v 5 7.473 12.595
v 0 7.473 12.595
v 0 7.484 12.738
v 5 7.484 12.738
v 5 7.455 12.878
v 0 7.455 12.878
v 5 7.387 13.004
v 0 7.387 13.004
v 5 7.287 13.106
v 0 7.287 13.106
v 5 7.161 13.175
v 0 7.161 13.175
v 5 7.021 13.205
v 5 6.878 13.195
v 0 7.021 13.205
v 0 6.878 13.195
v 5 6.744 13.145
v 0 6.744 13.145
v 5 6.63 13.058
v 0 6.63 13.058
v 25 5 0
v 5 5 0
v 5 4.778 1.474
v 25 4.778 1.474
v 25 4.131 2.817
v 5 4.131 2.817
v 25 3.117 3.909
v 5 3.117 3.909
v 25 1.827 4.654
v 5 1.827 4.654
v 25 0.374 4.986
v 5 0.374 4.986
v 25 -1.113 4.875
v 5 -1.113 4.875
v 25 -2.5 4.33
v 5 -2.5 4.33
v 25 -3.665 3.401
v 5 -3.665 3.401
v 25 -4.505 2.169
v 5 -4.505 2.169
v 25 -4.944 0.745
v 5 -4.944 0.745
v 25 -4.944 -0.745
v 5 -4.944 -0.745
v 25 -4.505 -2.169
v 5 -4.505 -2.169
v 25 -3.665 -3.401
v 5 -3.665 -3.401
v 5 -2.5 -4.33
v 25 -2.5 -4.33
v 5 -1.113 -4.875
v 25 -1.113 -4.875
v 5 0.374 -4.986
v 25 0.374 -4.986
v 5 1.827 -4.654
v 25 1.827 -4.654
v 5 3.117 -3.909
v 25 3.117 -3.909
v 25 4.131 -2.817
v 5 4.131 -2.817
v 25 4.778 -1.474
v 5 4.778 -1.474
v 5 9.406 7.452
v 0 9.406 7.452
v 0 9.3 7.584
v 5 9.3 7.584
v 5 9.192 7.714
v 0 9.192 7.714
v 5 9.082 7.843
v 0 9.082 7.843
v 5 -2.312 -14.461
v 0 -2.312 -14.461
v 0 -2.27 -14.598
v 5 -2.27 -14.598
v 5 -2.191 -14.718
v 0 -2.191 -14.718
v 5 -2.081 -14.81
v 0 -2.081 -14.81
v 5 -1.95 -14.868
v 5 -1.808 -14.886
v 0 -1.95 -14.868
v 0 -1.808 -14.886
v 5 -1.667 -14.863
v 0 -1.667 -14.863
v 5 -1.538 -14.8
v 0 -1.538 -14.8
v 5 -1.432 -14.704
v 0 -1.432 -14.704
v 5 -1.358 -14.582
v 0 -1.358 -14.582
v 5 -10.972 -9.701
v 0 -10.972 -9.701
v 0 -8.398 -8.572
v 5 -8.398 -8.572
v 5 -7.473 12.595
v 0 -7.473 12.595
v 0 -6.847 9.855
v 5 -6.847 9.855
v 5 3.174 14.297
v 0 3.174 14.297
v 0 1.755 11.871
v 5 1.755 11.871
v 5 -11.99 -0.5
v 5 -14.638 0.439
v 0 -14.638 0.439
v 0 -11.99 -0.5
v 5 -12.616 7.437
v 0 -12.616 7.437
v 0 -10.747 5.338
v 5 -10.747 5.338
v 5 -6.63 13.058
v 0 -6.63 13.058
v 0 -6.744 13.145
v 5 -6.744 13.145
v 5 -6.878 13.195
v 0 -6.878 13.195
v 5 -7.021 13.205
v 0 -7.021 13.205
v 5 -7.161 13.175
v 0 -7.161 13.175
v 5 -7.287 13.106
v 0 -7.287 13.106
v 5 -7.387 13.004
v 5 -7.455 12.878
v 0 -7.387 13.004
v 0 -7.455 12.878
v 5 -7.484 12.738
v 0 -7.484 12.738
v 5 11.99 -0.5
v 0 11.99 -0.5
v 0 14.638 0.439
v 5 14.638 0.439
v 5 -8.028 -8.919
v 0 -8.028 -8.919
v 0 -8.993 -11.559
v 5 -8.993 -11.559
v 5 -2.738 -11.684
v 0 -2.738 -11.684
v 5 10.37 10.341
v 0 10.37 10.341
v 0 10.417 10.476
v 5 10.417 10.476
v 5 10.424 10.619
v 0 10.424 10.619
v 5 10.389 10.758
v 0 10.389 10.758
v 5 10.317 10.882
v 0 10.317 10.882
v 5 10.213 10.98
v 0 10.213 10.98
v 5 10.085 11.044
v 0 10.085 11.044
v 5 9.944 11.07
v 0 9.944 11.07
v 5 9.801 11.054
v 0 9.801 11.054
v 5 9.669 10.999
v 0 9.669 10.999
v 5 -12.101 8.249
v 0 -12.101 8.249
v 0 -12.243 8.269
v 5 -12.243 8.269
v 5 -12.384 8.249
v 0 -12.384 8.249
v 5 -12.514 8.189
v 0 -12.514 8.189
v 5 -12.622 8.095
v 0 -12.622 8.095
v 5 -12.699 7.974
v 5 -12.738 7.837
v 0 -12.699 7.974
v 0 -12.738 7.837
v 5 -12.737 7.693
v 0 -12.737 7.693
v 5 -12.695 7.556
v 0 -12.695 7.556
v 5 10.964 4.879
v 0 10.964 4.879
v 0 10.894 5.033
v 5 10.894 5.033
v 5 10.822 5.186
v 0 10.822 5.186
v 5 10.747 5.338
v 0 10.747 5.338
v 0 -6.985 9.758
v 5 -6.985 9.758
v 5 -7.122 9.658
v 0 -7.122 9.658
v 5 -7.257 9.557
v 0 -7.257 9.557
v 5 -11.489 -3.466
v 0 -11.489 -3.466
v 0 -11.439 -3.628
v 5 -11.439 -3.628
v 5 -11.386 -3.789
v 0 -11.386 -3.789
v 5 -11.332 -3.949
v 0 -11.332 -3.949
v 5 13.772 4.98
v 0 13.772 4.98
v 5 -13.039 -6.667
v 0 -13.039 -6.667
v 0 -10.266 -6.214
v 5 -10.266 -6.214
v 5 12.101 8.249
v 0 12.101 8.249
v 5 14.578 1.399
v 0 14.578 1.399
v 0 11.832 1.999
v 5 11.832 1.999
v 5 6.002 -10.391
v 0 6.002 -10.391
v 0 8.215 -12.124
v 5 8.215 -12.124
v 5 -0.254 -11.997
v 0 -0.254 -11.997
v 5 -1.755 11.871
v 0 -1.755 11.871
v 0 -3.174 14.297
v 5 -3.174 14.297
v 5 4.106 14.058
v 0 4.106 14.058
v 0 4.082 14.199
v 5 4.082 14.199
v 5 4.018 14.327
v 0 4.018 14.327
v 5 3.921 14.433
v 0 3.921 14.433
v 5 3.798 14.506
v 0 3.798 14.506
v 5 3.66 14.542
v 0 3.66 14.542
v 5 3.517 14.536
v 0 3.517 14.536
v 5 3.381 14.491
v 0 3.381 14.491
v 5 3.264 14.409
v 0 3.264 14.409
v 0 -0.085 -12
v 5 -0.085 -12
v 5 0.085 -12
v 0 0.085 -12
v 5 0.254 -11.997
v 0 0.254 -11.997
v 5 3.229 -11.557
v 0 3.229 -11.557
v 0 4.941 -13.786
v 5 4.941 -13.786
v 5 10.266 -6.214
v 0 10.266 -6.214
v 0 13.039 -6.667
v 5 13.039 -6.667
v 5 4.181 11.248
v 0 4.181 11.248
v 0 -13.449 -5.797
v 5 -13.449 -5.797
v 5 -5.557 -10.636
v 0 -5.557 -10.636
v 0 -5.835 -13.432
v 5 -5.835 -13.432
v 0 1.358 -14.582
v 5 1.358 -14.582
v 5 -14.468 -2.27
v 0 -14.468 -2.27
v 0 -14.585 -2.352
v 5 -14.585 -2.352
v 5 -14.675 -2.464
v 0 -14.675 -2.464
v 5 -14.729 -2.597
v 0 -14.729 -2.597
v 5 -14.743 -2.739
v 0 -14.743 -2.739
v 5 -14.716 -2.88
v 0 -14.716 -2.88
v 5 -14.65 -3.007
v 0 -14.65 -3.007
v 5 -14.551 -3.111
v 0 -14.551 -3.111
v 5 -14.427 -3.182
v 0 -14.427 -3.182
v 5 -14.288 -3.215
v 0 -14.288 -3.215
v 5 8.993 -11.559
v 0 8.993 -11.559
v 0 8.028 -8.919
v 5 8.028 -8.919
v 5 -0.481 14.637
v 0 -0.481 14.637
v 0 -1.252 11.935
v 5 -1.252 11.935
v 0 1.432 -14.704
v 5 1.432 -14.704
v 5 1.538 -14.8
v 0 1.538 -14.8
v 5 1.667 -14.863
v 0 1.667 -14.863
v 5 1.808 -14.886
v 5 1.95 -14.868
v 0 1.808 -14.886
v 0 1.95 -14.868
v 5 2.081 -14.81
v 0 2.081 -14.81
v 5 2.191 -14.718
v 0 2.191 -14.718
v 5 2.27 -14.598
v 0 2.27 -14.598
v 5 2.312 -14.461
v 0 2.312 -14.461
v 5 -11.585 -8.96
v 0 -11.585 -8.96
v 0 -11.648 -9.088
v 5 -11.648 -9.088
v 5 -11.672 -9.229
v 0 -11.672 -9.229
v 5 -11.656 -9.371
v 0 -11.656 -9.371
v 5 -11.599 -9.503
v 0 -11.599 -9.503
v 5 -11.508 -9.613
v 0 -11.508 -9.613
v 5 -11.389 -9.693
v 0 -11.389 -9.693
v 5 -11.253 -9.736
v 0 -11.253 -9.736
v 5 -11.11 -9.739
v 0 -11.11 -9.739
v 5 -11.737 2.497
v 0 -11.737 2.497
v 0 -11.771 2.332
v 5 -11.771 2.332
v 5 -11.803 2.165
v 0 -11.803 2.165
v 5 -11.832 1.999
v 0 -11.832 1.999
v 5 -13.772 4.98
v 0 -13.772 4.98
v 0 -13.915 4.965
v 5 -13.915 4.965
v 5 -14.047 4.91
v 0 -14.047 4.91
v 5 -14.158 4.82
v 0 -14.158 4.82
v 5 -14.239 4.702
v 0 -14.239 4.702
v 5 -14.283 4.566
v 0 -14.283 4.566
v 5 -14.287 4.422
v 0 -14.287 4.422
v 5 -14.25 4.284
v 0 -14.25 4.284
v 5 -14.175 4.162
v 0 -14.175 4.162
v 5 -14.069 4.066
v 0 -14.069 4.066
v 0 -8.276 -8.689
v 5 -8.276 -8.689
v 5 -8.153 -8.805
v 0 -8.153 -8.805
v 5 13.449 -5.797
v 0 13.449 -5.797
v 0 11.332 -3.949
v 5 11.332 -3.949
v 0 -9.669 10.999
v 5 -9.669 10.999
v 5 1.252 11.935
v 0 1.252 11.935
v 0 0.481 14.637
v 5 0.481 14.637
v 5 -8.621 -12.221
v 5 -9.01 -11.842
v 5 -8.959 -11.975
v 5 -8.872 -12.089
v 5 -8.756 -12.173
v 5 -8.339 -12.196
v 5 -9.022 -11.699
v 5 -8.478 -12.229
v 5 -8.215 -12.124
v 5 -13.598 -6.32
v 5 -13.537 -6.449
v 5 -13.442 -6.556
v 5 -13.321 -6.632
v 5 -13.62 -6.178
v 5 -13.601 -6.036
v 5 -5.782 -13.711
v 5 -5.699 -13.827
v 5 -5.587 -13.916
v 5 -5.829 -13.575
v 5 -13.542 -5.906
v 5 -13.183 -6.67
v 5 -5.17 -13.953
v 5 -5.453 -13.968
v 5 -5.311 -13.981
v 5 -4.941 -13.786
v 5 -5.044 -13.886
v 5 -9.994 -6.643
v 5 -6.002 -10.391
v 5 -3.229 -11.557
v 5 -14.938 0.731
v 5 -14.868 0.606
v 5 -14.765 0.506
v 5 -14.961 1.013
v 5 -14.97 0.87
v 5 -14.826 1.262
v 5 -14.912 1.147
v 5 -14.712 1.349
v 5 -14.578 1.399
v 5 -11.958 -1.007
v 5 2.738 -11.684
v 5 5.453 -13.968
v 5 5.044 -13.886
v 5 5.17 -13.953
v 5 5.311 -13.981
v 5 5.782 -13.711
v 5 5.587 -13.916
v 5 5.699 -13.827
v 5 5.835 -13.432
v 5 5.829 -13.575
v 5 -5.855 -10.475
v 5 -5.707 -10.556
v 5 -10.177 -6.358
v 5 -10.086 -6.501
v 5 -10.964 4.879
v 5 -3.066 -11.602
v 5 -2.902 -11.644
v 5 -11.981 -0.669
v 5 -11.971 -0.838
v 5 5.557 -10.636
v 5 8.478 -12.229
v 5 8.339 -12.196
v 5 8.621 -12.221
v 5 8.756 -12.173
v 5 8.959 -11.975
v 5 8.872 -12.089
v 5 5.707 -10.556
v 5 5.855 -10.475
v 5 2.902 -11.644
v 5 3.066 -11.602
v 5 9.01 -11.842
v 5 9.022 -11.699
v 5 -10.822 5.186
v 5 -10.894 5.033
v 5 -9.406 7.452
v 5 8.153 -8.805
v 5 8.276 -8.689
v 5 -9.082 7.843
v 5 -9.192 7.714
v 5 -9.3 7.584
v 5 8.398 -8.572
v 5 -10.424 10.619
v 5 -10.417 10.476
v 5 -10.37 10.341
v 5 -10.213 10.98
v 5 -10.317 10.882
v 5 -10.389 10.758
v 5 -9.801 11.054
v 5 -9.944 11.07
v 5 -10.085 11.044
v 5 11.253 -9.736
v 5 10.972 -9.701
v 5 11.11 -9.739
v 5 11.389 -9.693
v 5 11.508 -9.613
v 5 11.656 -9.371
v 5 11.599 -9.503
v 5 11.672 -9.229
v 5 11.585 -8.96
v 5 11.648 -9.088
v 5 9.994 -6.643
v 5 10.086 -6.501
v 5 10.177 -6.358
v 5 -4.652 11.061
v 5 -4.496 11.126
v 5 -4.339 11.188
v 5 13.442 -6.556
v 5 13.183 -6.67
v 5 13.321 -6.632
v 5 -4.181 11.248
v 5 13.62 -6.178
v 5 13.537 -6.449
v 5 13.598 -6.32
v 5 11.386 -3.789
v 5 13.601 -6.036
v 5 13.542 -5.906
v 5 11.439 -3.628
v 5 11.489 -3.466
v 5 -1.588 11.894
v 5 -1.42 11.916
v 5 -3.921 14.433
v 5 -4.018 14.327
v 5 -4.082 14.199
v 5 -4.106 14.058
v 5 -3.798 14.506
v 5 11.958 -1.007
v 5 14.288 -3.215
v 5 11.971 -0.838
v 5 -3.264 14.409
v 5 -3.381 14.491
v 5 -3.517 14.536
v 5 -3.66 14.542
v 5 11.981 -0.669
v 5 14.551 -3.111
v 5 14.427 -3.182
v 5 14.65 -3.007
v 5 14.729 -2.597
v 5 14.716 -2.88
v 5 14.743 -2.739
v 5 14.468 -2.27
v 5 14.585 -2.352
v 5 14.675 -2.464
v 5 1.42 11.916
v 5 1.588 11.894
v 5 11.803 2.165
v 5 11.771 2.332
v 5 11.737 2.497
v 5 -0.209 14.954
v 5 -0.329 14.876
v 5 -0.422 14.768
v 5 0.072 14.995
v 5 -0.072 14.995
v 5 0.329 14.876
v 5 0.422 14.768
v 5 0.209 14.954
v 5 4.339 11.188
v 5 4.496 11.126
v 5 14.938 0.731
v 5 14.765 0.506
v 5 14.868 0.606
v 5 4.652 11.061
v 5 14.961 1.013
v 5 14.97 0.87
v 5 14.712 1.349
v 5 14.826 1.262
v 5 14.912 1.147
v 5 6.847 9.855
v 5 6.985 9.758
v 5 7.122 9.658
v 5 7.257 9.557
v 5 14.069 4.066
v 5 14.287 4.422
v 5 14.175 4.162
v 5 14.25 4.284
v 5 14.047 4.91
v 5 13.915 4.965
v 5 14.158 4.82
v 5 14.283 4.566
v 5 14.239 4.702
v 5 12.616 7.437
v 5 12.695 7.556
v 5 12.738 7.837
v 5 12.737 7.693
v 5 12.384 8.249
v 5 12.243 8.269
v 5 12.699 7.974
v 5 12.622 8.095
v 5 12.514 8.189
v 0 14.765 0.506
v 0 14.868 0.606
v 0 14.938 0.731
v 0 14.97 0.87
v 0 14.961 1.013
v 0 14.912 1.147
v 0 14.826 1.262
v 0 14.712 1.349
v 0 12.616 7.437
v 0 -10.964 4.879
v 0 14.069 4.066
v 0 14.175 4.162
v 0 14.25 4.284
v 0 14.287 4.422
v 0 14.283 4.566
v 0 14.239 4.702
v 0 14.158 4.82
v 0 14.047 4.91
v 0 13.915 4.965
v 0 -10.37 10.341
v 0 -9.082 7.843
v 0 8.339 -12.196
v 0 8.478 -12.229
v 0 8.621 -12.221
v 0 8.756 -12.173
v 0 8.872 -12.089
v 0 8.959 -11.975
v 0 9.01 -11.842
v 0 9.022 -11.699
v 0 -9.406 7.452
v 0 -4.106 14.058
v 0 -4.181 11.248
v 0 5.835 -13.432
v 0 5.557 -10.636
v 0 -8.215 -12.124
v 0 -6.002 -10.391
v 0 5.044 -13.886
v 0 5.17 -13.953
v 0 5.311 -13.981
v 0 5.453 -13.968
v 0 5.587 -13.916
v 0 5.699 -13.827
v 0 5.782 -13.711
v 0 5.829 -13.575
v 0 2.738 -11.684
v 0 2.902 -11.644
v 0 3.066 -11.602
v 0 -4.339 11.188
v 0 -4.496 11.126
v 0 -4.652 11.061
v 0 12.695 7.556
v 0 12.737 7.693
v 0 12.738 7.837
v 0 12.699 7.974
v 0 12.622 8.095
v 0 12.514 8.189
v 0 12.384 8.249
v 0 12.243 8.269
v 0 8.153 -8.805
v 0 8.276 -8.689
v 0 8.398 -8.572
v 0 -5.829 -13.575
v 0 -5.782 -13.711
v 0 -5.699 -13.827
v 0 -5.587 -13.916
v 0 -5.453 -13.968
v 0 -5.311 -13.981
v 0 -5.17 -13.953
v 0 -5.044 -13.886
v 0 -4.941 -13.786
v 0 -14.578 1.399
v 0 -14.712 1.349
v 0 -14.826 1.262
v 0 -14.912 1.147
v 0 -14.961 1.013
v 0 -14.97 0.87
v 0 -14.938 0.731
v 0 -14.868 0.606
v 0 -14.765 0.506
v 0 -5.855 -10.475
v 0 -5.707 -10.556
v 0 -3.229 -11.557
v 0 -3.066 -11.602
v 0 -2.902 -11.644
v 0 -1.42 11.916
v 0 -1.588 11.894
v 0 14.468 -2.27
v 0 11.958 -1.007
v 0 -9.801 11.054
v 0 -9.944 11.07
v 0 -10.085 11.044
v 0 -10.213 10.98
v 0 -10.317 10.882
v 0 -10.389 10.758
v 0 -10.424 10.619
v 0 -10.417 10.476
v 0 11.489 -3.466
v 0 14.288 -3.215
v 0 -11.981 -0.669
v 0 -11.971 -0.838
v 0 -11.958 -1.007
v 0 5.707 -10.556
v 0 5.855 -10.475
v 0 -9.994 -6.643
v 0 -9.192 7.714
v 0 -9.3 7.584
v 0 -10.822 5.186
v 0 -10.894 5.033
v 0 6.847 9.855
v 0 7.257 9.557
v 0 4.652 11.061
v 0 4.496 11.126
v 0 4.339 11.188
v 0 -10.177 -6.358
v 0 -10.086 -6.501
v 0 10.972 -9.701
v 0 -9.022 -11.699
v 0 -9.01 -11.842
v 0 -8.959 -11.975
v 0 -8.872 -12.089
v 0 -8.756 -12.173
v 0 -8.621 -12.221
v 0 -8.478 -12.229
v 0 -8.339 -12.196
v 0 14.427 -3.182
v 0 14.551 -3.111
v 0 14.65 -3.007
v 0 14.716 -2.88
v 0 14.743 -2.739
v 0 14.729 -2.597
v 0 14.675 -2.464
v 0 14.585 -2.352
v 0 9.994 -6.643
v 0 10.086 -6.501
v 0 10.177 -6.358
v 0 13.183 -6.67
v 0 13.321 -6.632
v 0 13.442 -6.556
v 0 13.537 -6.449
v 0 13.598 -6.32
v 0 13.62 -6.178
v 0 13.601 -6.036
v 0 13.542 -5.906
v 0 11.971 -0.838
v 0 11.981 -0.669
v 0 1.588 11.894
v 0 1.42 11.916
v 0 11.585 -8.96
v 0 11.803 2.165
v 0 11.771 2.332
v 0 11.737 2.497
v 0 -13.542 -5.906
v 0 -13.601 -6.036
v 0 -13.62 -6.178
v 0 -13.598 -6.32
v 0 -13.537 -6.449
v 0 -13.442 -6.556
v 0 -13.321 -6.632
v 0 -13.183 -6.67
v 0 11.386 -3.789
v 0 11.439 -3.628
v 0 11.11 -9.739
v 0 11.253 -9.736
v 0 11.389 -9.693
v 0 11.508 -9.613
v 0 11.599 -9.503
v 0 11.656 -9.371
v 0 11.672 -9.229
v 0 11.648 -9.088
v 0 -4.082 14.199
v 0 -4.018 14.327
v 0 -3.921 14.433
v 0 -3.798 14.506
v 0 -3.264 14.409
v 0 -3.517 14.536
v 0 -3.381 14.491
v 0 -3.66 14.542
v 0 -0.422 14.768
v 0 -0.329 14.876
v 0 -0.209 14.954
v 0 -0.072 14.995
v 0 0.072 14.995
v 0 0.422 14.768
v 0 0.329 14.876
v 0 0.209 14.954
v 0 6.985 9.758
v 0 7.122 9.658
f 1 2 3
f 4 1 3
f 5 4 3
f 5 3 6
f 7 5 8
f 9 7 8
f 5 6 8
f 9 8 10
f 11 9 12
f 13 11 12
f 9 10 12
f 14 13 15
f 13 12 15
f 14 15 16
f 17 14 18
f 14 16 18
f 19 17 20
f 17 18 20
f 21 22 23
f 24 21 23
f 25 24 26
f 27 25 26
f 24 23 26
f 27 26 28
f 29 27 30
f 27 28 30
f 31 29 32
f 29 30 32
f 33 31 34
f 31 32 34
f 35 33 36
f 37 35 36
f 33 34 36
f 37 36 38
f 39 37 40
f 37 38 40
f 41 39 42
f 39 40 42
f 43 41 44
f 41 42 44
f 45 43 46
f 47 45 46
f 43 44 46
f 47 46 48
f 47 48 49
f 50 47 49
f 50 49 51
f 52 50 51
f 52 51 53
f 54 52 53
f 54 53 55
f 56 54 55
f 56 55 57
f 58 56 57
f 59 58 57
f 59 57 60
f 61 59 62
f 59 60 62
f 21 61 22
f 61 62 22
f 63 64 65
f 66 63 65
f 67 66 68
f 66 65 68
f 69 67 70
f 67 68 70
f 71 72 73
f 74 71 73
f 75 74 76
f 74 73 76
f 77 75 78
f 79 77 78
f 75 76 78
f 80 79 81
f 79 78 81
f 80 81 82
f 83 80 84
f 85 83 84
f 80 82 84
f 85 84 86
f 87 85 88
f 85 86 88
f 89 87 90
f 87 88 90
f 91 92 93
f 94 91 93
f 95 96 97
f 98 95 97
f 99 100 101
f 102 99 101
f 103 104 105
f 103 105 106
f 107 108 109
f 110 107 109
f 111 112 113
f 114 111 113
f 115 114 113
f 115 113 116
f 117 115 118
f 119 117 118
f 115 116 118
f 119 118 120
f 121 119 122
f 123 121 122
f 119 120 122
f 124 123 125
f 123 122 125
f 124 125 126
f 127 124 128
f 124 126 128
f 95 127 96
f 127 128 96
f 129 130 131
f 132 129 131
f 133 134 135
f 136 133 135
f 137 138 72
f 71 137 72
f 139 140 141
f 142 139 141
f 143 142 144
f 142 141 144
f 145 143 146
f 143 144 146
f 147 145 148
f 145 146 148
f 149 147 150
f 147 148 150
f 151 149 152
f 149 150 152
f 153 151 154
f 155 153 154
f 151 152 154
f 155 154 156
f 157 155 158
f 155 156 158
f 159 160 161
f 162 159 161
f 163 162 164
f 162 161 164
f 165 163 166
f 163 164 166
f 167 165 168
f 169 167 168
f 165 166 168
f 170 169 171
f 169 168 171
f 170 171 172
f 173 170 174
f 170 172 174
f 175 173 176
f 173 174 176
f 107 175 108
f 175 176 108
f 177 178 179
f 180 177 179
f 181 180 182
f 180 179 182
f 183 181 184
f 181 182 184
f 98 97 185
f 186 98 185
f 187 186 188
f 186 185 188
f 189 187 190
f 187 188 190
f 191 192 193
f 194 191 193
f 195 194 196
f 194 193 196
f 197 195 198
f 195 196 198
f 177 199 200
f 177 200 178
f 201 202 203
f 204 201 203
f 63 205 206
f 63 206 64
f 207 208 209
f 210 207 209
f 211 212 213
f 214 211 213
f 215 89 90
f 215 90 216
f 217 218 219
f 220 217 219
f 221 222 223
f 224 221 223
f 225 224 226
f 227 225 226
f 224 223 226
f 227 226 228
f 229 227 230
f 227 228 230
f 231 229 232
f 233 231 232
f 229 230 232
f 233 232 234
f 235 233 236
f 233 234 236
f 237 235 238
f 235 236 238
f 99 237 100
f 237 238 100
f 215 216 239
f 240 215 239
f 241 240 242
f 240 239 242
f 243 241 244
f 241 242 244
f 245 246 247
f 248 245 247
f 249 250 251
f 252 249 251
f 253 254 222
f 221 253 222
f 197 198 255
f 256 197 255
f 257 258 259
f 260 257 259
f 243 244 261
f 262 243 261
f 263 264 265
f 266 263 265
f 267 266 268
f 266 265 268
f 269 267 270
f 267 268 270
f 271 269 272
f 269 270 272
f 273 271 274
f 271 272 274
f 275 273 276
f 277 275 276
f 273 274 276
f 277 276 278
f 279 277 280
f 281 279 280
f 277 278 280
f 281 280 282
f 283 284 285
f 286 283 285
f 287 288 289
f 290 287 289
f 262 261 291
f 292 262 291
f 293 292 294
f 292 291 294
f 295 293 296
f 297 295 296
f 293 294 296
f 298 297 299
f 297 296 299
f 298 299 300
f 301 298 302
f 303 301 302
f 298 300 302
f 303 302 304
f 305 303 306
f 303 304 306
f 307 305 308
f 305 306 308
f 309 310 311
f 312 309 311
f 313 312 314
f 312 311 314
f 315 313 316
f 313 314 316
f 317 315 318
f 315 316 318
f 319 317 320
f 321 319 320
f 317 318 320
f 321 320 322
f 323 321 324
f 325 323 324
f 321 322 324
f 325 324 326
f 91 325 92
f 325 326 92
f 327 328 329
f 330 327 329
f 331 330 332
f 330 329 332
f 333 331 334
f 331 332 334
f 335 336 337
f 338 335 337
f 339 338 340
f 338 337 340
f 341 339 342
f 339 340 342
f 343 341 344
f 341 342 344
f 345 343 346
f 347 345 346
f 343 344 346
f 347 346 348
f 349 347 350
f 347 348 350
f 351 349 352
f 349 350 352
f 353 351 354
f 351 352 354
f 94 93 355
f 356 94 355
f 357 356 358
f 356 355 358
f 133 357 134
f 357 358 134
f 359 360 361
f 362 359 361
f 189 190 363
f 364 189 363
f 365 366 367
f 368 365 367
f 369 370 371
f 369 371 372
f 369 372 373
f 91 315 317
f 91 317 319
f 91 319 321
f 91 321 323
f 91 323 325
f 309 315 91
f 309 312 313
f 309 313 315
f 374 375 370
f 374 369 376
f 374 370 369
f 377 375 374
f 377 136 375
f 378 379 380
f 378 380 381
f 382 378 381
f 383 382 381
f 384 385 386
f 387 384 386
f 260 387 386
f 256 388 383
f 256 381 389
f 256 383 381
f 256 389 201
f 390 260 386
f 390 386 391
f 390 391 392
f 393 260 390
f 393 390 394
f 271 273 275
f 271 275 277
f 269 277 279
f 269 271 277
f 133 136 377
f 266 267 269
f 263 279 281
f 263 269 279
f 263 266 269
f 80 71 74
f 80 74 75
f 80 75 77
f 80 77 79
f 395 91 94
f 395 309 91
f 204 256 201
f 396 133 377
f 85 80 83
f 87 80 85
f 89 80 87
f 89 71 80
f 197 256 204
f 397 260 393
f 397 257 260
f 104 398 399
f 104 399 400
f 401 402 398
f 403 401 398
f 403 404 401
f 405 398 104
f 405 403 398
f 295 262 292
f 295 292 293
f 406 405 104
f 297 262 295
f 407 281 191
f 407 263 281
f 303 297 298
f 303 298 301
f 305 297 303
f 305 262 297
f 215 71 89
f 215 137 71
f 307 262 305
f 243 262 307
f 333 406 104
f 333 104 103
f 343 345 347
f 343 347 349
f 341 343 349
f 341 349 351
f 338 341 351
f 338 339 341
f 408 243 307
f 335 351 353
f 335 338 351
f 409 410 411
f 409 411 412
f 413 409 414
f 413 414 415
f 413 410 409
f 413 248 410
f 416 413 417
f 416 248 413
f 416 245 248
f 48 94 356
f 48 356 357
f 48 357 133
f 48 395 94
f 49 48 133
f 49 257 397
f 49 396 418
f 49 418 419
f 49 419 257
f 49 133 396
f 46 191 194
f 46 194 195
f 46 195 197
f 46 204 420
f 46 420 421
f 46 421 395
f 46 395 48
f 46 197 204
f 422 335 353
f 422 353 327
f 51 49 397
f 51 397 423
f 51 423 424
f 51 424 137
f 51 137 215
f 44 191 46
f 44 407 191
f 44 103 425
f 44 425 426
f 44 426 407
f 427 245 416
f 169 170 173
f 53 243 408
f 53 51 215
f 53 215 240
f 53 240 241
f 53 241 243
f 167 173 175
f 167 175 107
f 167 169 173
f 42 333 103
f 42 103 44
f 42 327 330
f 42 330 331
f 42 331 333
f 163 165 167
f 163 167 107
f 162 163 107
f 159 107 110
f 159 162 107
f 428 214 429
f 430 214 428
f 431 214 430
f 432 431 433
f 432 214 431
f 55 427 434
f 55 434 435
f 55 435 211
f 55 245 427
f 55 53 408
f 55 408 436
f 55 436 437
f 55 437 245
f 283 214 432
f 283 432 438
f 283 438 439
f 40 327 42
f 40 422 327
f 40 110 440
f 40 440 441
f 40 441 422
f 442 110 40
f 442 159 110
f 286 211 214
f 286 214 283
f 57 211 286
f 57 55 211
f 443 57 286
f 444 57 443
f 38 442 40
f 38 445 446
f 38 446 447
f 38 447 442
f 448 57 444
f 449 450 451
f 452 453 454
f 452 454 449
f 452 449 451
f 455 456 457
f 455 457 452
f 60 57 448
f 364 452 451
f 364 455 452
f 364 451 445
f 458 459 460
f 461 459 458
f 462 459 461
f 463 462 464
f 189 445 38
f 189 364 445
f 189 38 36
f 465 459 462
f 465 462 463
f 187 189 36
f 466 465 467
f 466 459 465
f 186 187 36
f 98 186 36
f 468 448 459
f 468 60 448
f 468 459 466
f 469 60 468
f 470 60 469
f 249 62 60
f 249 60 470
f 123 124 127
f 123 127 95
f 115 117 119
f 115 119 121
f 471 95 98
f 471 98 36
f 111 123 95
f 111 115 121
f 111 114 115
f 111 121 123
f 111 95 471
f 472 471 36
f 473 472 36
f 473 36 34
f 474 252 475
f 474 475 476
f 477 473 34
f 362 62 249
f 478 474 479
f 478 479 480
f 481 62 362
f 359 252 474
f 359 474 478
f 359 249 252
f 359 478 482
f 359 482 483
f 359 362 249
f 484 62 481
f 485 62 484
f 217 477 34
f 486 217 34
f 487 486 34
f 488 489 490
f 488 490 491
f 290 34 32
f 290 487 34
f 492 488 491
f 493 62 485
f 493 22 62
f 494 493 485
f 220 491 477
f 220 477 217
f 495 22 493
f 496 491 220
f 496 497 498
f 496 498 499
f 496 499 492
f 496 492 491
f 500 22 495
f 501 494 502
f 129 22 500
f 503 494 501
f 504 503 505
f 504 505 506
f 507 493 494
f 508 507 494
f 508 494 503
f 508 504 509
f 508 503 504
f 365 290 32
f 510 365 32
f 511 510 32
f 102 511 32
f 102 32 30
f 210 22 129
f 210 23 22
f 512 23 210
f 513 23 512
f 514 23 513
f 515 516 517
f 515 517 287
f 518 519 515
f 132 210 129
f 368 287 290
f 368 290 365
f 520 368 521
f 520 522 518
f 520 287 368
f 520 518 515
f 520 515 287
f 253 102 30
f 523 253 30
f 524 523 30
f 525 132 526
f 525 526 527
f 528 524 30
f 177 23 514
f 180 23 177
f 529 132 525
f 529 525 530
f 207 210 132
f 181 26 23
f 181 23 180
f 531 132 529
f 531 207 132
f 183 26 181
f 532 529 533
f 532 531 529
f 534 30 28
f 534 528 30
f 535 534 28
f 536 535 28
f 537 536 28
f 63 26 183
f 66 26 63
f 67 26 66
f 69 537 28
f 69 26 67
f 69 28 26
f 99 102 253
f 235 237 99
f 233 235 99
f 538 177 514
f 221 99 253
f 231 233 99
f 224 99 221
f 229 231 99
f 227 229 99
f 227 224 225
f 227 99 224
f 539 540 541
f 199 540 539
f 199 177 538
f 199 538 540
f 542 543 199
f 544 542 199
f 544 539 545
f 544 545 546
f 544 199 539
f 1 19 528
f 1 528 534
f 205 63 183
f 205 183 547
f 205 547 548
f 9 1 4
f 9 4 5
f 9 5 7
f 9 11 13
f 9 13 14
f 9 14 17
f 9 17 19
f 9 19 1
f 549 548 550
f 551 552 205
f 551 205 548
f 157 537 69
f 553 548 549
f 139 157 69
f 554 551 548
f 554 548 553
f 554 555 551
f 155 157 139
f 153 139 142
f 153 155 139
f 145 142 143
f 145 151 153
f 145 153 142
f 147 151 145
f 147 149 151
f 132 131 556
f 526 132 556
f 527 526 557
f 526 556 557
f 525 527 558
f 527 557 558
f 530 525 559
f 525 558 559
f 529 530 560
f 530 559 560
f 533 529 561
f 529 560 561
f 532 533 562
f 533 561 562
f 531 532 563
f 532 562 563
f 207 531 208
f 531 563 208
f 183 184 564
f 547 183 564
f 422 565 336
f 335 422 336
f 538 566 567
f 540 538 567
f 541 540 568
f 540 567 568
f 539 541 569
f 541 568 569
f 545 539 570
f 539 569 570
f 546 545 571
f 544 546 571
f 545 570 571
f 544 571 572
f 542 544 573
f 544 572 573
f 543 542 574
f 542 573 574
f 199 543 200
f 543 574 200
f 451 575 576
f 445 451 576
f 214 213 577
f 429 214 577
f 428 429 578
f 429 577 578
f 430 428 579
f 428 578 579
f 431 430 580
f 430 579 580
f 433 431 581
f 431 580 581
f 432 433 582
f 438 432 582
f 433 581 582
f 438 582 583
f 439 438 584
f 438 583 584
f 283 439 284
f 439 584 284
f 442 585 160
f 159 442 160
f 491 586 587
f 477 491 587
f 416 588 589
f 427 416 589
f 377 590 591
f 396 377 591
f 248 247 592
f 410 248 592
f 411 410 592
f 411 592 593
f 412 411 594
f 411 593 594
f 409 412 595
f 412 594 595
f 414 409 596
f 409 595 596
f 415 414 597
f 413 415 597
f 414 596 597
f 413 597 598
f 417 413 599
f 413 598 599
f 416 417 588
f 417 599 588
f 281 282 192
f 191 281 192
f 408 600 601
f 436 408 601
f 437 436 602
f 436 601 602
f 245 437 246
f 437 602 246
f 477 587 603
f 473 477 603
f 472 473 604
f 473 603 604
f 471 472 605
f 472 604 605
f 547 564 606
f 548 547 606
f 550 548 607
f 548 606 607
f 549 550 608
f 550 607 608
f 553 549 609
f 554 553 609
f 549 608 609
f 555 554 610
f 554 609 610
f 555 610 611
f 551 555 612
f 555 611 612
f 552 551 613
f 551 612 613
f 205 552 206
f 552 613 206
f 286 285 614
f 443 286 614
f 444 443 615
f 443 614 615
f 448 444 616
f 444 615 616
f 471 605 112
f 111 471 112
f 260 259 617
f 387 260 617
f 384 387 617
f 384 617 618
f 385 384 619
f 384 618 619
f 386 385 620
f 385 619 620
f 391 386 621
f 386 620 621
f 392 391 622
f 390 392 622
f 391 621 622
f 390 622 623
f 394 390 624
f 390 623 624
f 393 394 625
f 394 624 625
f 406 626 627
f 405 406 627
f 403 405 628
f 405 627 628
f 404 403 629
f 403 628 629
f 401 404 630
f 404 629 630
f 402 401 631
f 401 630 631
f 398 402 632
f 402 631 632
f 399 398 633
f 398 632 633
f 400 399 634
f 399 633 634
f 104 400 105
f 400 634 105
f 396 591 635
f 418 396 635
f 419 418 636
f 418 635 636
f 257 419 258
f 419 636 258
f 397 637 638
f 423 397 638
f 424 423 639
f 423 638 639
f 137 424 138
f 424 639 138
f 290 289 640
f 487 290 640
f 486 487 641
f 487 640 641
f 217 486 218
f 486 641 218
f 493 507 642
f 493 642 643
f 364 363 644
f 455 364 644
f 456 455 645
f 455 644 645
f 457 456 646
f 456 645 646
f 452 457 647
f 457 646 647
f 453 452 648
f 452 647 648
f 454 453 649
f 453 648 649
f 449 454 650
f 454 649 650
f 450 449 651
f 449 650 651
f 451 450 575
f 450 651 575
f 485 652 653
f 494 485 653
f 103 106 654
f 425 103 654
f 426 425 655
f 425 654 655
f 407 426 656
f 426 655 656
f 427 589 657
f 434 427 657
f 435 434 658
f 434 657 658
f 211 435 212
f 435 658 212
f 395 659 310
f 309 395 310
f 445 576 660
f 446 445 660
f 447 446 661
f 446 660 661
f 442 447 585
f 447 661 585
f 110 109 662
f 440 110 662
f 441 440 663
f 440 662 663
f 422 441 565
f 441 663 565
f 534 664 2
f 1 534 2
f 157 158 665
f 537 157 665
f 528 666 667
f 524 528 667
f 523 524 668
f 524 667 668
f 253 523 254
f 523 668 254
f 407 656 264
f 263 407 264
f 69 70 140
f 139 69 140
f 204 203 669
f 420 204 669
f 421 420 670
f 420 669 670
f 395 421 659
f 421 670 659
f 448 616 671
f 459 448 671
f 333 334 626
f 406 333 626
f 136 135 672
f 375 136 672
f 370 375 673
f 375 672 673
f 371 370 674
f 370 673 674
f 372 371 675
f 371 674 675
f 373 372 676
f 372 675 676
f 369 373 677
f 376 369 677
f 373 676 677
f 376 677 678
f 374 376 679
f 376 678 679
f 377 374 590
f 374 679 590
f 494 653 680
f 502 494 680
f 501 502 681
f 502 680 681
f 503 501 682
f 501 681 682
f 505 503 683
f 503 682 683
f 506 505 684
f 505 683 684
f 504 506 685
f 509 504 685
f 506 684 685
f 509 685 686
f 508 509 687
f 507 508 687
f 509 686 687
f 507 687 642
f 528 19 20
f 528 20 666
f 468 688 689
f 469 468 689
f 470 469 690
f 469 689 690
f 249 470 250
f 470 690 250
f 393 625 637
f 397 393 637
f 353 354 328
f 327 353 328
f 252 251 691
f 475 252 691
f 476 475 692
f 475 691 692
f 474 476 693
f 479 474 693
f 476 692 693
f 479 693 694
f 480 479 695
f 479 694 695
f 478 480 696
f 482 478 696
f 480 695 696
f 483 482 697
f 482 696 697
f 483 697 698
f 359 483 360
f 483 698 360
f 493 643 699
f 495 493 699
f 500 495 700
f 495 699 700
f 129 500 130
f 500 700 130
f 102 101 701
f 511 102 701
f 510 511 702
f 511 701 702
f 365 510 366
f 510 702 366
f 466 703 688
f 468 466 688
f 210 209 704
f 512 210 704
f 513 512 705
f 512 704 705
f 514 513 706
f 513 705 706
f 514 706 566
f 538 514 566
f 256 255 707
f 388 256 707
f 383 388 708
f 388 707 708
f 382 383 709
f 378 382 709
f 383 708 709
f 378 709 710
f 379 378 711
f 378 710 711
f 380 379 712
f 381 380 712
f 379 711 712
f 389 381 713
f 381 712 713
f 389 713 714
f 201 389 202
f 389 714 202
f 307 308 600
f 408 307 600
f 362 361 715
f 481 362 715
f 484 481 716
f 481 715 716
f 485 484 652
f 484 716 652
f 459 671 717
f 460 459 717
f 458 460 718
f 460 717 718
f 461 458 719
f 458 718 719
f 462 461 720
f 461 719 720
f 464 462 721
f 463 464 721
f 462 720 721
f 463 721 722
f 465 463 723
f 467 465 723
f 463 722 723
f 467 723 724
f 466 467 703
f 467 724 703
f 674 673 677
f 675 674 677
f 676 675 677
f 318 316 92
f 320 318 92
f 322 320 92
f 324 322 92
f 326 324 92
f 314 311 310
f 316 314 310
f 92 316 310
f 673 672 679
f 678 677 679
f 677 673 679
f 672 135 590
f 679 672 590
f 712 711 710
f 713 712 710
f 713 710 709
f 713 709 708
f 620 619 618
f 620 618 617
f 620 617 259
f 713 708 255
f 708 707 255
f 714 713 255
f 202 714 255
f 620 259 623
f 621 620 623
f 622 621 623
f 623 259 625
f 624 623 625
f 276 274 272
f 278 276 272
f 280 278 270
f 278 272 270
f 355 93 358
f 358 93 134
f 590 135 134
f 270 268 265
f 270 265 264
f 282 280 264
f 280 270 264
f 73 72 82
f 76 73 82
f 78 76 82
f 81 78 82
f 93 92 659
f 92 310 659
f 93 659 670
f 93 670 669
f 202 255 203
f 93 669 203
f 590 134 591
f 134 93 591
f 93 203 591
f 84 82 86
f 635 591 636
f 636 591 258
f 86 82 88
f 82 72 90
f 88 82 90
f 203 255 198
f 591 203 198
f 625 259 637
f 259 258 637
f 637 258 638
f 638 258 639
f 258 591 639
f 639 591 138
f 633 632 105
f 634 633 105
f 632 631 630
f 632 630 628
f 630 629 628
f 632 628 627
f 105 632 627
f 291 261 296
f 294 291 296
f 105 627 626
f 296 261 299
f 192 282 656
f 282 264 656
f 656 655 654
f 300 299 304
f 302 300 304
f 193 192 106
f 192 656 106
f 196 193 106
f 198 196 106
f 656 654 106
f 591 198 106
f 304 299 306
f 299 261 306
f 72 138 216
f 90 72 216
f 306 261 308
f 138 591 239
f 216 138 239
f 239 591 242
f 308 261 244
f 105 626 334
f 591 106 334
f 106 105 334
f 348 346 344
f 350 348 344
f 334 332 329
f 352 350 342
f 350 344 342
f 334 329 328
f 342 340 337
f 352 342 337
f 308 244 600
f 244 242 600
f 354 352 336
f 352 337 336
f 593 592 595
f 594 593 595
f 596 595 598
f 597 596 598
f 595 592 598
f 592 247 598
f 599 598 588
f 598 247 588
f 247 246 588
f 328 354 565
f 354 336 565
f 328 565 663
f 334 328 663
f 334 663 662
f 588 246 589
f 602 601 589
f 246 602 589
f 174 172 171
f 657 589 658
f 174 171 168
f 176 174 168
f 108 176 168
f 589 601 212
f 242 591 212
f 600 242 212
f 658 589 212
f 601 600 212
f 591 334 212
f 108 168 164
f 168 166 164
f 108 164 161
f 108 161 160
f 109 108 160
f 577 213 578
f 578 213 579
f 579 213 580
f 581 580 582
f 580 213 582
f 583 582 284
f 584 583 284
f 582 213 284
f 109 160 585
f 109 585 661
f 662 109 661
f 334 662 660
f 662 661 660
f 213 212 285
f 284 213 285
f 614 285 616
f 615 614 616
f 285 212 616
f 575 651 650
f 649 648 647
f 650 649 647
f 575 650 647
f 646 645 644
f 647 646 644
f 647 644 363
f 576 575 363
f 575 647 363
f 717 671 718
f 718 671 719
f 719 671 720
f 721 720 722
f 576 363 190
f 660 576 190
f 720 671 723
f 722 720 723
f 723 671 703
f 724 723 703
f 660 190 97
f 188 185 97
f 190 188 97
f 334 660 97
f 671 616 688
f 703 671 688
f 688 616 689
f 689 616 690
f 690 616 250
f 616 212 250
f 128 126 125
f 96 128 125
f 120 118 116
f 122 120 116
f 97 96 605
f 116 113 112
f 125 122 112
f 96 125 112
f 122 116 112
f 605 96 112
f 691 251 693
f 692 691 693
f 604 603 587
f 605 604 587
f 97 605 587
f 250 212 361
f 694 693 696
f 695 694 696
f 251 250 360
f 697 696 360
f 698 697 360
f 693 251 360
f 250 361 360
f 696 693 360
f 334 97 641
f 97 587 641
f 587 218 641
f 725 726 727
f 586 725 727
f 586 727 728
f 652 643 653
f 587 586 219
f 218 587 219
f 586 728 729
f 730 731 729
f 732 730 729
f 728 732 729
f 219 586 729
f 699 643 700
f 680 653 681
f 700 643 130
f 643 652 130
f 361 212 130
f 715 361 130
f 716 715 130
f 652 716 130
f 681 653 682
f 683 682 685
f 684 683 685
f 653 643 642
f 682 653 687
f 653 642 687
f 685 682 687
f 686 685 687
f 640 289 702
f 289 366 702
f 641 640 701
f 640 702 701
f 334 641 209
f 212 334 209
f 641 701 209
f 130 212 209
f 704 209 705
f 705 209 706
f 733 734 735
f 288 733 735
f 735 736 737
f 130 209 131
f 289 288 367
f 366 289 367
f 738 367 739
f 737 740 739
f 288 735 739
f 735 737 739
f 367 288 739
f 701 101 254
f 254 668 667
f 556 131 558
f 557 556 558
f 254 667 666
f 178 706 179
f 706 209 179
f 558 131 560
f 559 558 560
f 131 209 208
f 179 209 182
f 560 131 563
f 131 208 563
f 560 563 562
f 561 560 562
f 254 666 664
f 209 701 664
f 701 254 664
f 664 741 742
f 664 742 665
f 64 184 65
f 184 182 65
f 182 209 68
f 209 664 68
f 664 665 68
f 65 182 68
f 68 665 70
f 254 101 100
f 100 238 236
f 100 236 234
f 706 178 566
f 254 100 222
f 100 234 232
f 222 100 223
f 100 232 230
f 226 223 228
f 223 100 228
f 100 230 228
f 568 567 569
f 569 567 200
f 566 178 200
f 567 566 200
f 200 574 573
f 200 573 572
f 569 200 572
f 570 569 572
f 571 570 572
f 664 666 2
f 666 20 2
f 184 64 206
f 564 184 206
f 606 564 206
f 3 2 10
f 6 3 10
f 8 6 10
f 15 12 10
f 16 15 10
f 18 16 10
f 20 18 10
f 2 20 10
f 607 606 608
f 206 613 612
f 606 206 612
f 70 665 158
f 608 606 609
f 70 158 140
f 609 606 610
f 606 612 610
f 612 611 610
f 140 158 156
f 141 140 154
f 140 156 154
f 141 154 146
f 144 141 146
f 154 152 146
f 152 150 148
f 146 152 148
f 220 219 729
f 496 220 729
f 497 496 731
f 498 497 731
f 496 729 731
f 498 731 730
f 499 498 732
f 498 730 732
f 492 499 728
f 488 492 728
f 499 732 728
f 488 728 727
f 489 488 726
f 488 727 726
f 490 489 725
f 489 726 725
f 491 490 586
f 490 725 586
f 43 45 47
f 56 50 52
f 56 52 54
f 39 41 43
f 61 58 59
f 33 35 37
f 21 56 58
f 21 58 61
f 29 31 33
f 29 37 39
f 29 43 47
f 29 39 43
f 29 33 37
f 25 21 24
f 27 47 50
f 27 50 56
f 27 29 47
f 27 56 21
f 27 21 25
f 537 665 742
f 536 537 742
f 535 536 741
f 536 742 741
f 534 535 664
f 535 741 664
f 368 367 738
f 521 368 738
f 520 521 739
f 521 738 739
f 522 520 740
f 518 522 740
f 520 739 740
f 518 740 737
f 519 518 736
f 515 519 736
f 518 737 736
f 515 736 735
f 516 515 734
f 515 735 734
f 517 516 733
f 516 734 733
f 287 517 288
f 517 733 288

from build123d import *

# Parameters (mm, degrees)
F1_DEPTH = 5
F2_R     = 5
F3_DEPTH = 20


with BuildPart() as f1:
    # F0 (on Right) → F1 (new body)
    with BuildSketch(Plane.YZ):
        with BuildLine():
            Line((1.251901, 11.934519), (0.480814, 14.637179))
            ThreePointArc((0.480814, 14.637179), (0, 15), (-0.480814, 14.637179))
            Line((-0.480814, 14.637179), (-1.251901, 11.934519))
            ThreePointArc((-1.251901, 11.934519), (0, 12), (1.251901, 11.934519))
        make_face()
        with BuildLine():
            ThreePointArc((1.755424, 11.870909), (1.503999, 11.905376), (1.251901, 11.934519))
            ThreePointArc((1.251901, 11.934519), (0, 12), (-1.251901, 11.934519))
            ThreePointArc((-1.251901, 11.934519), (-1.503999, 11.905376), (-1.755424, 11.870909))
            ThreePointArc((-1.755424, 11.870909), (-2.984279, 11.622998), (-4.180564, 11.248239))
            ThreePointArc((-4.180564, 11.248239), (-4.417495, 11.157318), (-4.652449, 11.061407))
            ThreePointArc((-4.652449, 11.061407), (-5.781044, 10.51568), (-6.846547, 9.855191))
            ThreePointArc((-6.846547, 9.855191), (-7.053423, 9.708204), (-7.257144, 9.556875))
            ThreePointArc((-7.257144, 9.556875), (-8.214565, 8.747624), (-9.082337, 7.842905))
            ThreePointArc((-9.082337, 7.842905), (-9.246159, 7.649088), (-9.405846, 7.45185))
            ThreePointArc((-9.405846, 7.45185), (-10.131935, 6.429922), (-10.74745, 5.33782))
            ThreePointArc((-10.74745, 5.33782), (-10.857925, 5.109351), (-10.963544, 4.878598))
            ThreePointArc((-10.963544, 4.878598), (-11.412678, 3.708204), (-11.737261, 2.497341))
            ThreePointArc((-11.737261, 2.497341), (-11.787447, 2.248576), (-11.832361, 1.998805))
            ThreePointArc((-11.832361, 1.998805), (-11.976321, 0.753486), (-11.989576, -0.500056))
            ThreePointArc((-11.989576, -0.500056), (-11.976321, -0.753486), (-11.957709, -1.00658))
            ThreePointArc((-11.957709, -1.00658), (-11.787447, -2.248576), (-11.488543, -3.466032))
            ThreePointArc((-11.488543, -3.466032), (-11.412678, -3.708204), (-11.331709, -3.948717))
            ThreePointArc((-11.331709, -3.948717), (-10.857925, -5.109351), (-10.265642, -6.214225))
            ThreePointArc((-10.265642, -6.214225), (-10.131935, -6.429922), (-9.993697, -6.642743))
            ThreePointArc((-9.993697, -6.642743), (-9.246159, -7.649088), (-8.397713, -8.571955))
            ThreePointArc((-8.397713, -8.571955), (-8.214565, -8.747624), (-8.027743, -8.91938))
            ThreePointArc((-8.027743, -8.91938), (-7.053423, -9.708204), (-6.002125, -10.391077))
            ThreePointArc((-6.002125, -10.391077), (-5.781044, -10.51568), (-5.557377, -10.63558))
            ThreePointArc((-5.557377, -10.63558), (-4.417495, -11.157318), (-3.229402, -11.557291))
            ThreePointArc((-3.229402, -11.557291), (-2.984279, -11.622998), (-2.737821, -11.683507))
            ThreePointArc((-2.737821, -11.683507), (-1.503999, -11.905376), (-0.253763, -11.997317))
            ThreePointArc((-0.253763, -11.997317), (0, -12), (0.253763, -11.997317))
            ThreePointArc((0.253763, -11.997317), (1.503999, -11.905376), (2.737821, -11.683507))
            ThreePointArc((2.737821, -11.683507), (2.984279, -11.622998), (3.229402, -11.557291))
            ThreePointArc((3.229402, -11.557291), (4.417495, -11.157318), (5.557377, -10.63558))
            ThreePointArc((5.557377, -10.63558), (5.781044, -10.51568), (6.002125, -10.391077))
            ThreePointArc((6.002125, -10.391077), (7.053423, -9.708204), (8.027743, -8.91938))
            ThreePointArc((8.027743, -8.91938), (8.214565, -8.747624), (8.397713, -8.571955))
            ThreePointArc((8.397713, -8.571955), (9.246159, -7.649088), (9.993697, -6.642743))
            ThreePointArc((9.993697, -6.642743), (10.131935, -6.429922), (10.265642, -6.214225))
            ThreePointArc((10.265642, -6.214225), (10.857925, -5.109351), (11.331709, -3.948717))
            ThreePointArc((11.331709, -3.948717), (11.412678, -3.708204), (11.488543, -3.466032))
            ThreePointArc((11.488543, -3.466032), (11.787447, -2.248576), (11.957709, -1.00658))
            ThreePointArc((11.957709, -1.00658), (11.976321, -0.753486), (11.989576, -0.500056))
            ThreePointArc((11.989576, -0.500056), (11.997394, -0.250082), (12, 0))
            ThreePointArc((12, 0), (11.958017, 1.002911), (11.832361, 1.998805))
            ThreePointArc((11.832361, 1.998805), (11.787447, 2.248576), (11.737261, 2.497341))
            ThreePointArc((11.737261, 2.497341), (11.412678, 3.708204), (10.963544, 4.878598))
            ThreePointArc((10.963544, 4.878598), (10.857925, 5.109351), (10.74745, 5.33782))
            ThreePointArc((10.74745, 5.33782), (10.131935, 6.429922), (9.405846, 7.45185))
            ThreePointArc((9.405846, 7.45185), (9.246159, 7.649088), (9.082337, 7.842905))
            ThreePointArc((9.082337, 7.842905), (8.214565, 8.747624), (7.257144, 9.556875))
            ThreePointArc((7.257144, 9.556875), (7.053423, 9.708204), (6.846547, 9.855191))
            ThreePointArc((6.846547, 9.855191), (5.781044, 10.51568), (4.652449, 11.061407))
            ThreePointArc((4.652449, 11.061407), (4.417495, 11.157318), (4.180564, 11.248239))
            ThreePointArc((4.180564, 11.248239), (2.984279, 11.622998), (1.755424, 11.870909))
        make_face()
        with BuildLine():
            Line((3.17441, 14.296899), (1.755424, 11.870909))
            ThreePointArc((1.755424, 11.870909), (2.984279, 11.622998), (4.180564, 11.248239))
            Line((4.180564, 11.248239), (4.105827, 14.057752))
            ThreePointArc((4.105827, 14.057752), (3.730348, 14.528747), (3.17441, 14.296899))
        make_face()
        with BuildLine():
            ThreePointArc((-4.180564, 11.248239), (-2.984279, 11.622998), (-1.755424, 11.870909))
            Line((-1.755424, 11.870909), (-3.17441, 14.296899))
            ThreePointArc((-3.17441, 14.296899), (-3.730348, 14.528747), (-4.105827, 14.057752))
            Line((-4.105827, 14.057752), (-4.180564, 11.248239))
        make_face()
        with BuildLine():
            Line((6.630175, 13.058292), (4.652449, 11.061407))
            ThreePointArc((4.652449, 11.061407), (5.781044, 10.51568), (6.846547, 9.855191))
            Line((6.846547, 9.855191), (7.472855, 12.595024))
            ThreePointArc((7.472855, 12.595024), (7.226305, 13.1446), (6.630175, 13.058292))
        make_face()
        with BuildLine():
            ThreePointArc((-6.846547, 9.855191), (-5.781044, 10.51568), (-4.652449, 11.061407))
            Line((-4.652449, 11.061407), (-6.630175, 13.058292))
            ThreePointArc((-6.630175, 13.058292), (-7.226305, 13.1446), (-7.472855, 12.595024))
            Line((-7.472855, 12.595024), (-6.846547, 9.855191))
        make_face()
        with BuildLine():
            Line((9.669341, 10.999184), (7.257144, 9.556875))
            ThreePointArc((7.257144, 9.556875), (8.214565, 8.747624), (9.082337, 7.842905))
            Line((9.082337, 7.842905), (10.370337, 10.340905))
            ThreePointArc((10.370337, 10.340905), (10.268207, 10.934529), (9.669341, 10.999184))
        make_face()
        with BuildLine():
            ThreePointArc((-9.082337, 7.842905), (-8.214565, 8.747624), (-7.257144, 9.556875))
            Line((-7.257144, 9.556875), (-9.669341, 10.999184))
            ThreePointArc((-9.669341, 10.999184), (-10.268207, 10.934529), (-10.370337, 10.340905))
            Line((-10.370337, 10.340905), (-9.082337, 7.842905))
        make_face()
        with BuildLine():
            Line((12.100946, 8.248957), (9.405846, 7.45185))
            ThreePointArc((9.405846, 7.45185), (10.131935, 6.429922), (10.74745, 5.33782))
            Line((10.74745, 5.33782), (12.616212, 7.437028))
            ThreePointArc((12.616212, 7.437028), (12.664919, 8.037402), (12.100946, 8.248957))
        make_face()
        with BuildLine():
            ThreePointArc((-10.74745, 5.33782), (-10.131935, 6.429922), (-9.405846, 7.45185))
            Line((-9.405846, 7.45185), (-12.100946, 8.248957))
            ThreePointArc((-12.100946, 8.248957), (-12.664919, 8.037402), (-12.616212, 7.437028))
            Line((-12.616212, 7.437028), (-10.74745, 5.33782))
        make_face()
        with BuildLine():
            Line((13.772205, 4.980418), (10.963544, 4.878598))
            ThreePointArc((10.963544, 4.878598), (11.412678, 3.708204), (11.737261, 2.497341))
            Line((11.737261, 2.497341), (14.069364, 4.065856))
            ThreePointArc((14.069364, 4.065856), (14.265848, 4.635255), (13.772205, 4.980418))
        make_face()
        with BuildLine():
            ThreePointArc((-11.737261, 2.497341), (-11.412678, 3.708204), (-10.963544, 4.878598))
            Line((-10.963544, 4.878598), (-13.772205, 4.980418))
            ThreePointArc((-13.772205, 4.980418), (-14.265848, 4.635255), (-14.069364, 4.065856))
            Line((-14.069364, 4.065856), (-11.737261, 2.497341))
        make_face()
        with BuildLine():
            Line((14.578106, 1.398941), (11.832361, 1.998805))
            ThreePointArc((11.832361, 1.998805), (11.958017, 1.002911), (12, 0))
            ThreePointArc((12, 0), (11.997394, -0.250082), (11.989576, -0.500056))
            Line((11.989576, -0.500056), (14.638487, 0.439211))
            ThreePointArc((14.638487, 0.439211), (14.970401, 0.941858), (14.578106, 1.398941))
        make_face()
        with BuildLine():
            ThreePointArc((-11.989576, -0.500056), (-11.976321, 0.753486), (-11.832361, 1.998805))
            Line((-11.832361, 1.998805), (-14.578106, 1.398941))
            ThreePointArc((-14.578106, 1.398941), (-14.970401, 0.941858), (-14.638487, 0.439211))
            Line((-14.638487, 0.439211), (-11.989576, -0.500056))
        make_face()
        with BuildLine():
            ThreePointArc((-11.488543, -3.466032), (-11.787447, -2.248576), (-11.957709, -1.00658))
            Line((-11.957709, -1.00658), (-14.46801, -2.270437))
            ThreePointArc((-14.46801, -2.270437), (-14.734309, -2.81072), (-14.287819, -3.215031))
            Line((-14.287819, -3.215031), (-11.488543, -3.466032))
        make_face()
        with BuildLine():
            Line((14.46801, -2.270437), (11.957709, -1.00658))
            ThreePointArc((11.957709, -1.00658), (11.787447, -2.248576), (11.488543, -3.466032))
            Line((11.488543, -3.466032), (14.287819, -3.215031))
            ThreePointArc((14.287819, -3.215031), (14.734309, -2.81072), (14.46801, -2.270437))
        make_face()
        with BuildLine():
            ThreePointArc((-10.265642, -6.214225), (-10.857925, -5.109351), (-11.331709, -3.948717))
            Line((-11.331709, -3.948717), (-13.448836, -5.797155))
            ThreePointArc((-13.448836, -5.797155), (-13.572406, -6.386689), (-13.039395, -6.667261))
            Line((-13.039395, -6.667261), (-10.265642, -6.214225))
        make_face()
        with BuildLine():
            Line((13.448836, -5.797155), (11.331709, -3.948717))
            ThreePointArc((11.331709, -3.948717), (10.857925, -5.109351), (10.265642, -6.214225))
            Line((10.265642, -6.214225), (13.039395, -6.667261))
            ThreePointArc((13.039395, -6.667261), (13.572406, -6.386689), (13.448836, -5.797155))
        make_face()
        with BuildLine():
            ThreePointArc((-8.397713, -8.571955), (-9.246159, -7.649088), (-9.993697, -6.642743))
            Line((-9.993697, -6.642743), (-11.584623, -8.959616))
            ThreePointArc((-11.584623, -8.959616), (-11.557699, -9.56136), (-10.971658, -9.700563))
            Line((-10.971658, -9.700563), (-8.397713, -8.571955))
        make_face()
        with BuildLine():
            Line((11.584623, -8.959616), (9.993697, -6.642743))
            ThreePointArc((9.993697, -6.642743), (9.246159, -7.649088), (8.397713, -8.571955))
            Line((8.397713, -8.571955), (10.971658, -9.700563))
            ThreePointArc((10.971658, -9.700563), (11.557699, -9.56136), (11.584623, -8.959616))
        make_face()
        with BuildLine():
            ThreePointArc((-6.002125, -10.391077), (-7.053423, -9.708204), (-8.027743, -8.91938))
            Line((-8.027743, -8.91938), (-8.992505, -11.559112))
            ThreePointArc((-8.992505, -11.559112), (-8.816779, -12.135255), (-8.214532, -12.124342))
            Line((-8.214532, -12.124342), (-6.002125, -10.391077))
        make_face()
        with BuildLine():
            Line((8.992505, -11.559112), (8.027743, -8.91938))
            ThreePointArc((8.027743, -8.91938), (7.053423, -9.708204), (6.002125, -10.391077))
            Line((6.002125, -10.391077), (8.214532, -12.124342))
            ThreePointArc((8.214532, -12.124342), (8.816779, -12.135255), (8.992505, -11.559112))
        make_face()
        with BuildLine():
            ThreePointArc((-3.229402, -11.557291), (-4.417495, -11.157318), (-5.557377, -10.63558))
            Line((-5.557377, -10.63558), (-5.835354, -13.432306))
            ThreePointArc((-5.835354, -13.432306), (-5.521868, -13.946647), (-4.941256, -13.786305))
            Line((-4.941256, -13.786305), (-3.229402, -11.557291))
        make_face()
        with BuildLine():
            Line((5.835354, -13.432306), (5.557377, -10.63558))
            ThreePointArc((5.557377, -10.63558), (4.417495, -11.157318), (3.229402, -11.557291))
            Line((3.229402, -11.557291), (4.941256, -13.786305))
            ThreePointArc((4.941256, -13.786305), (5.521868, -13.946647), (5.835354, -13.432306))
        make_face()
        with BuildLine():
            ThreePointArc((-0.253763, -11.997317), (-1.503999, -11.905376), (-2.737821, -11.683507))
            Line((-2.737821, -11.683507), (-2.311547, -14.461499))
            ThreePointArc((-2.311547, -14.461499), (-1.879999, -14.881721), (-1.357503, -14.582023))
            Line((-1.357503, -14.582023), (-0.253763, -11.997317))
        make_face()
        with BuildLine():
            Line((2.311547, -14.461499), (2.737821, -11.683507))
            ThreePointArc((2.737821, -11.683507), (1.503999, -11.905376), (0.253763, -11.997317))
            Line((0.253763, -11.997317), (1.357503, -14.582023))
            ThreePointArc((1.357503, -14.582023), (1.879999, -14.881721), (2.311547, -14.461499))
        make_face()
    extrude(amount=F1_DEPTH)

    # F2 (on face) → F3 (join)
    with BuildSketch(Plane.YZ.offset(5)):
        Circle(F2_R)
    extrude(amount=F3_DEPTH)


solid = f1.part
